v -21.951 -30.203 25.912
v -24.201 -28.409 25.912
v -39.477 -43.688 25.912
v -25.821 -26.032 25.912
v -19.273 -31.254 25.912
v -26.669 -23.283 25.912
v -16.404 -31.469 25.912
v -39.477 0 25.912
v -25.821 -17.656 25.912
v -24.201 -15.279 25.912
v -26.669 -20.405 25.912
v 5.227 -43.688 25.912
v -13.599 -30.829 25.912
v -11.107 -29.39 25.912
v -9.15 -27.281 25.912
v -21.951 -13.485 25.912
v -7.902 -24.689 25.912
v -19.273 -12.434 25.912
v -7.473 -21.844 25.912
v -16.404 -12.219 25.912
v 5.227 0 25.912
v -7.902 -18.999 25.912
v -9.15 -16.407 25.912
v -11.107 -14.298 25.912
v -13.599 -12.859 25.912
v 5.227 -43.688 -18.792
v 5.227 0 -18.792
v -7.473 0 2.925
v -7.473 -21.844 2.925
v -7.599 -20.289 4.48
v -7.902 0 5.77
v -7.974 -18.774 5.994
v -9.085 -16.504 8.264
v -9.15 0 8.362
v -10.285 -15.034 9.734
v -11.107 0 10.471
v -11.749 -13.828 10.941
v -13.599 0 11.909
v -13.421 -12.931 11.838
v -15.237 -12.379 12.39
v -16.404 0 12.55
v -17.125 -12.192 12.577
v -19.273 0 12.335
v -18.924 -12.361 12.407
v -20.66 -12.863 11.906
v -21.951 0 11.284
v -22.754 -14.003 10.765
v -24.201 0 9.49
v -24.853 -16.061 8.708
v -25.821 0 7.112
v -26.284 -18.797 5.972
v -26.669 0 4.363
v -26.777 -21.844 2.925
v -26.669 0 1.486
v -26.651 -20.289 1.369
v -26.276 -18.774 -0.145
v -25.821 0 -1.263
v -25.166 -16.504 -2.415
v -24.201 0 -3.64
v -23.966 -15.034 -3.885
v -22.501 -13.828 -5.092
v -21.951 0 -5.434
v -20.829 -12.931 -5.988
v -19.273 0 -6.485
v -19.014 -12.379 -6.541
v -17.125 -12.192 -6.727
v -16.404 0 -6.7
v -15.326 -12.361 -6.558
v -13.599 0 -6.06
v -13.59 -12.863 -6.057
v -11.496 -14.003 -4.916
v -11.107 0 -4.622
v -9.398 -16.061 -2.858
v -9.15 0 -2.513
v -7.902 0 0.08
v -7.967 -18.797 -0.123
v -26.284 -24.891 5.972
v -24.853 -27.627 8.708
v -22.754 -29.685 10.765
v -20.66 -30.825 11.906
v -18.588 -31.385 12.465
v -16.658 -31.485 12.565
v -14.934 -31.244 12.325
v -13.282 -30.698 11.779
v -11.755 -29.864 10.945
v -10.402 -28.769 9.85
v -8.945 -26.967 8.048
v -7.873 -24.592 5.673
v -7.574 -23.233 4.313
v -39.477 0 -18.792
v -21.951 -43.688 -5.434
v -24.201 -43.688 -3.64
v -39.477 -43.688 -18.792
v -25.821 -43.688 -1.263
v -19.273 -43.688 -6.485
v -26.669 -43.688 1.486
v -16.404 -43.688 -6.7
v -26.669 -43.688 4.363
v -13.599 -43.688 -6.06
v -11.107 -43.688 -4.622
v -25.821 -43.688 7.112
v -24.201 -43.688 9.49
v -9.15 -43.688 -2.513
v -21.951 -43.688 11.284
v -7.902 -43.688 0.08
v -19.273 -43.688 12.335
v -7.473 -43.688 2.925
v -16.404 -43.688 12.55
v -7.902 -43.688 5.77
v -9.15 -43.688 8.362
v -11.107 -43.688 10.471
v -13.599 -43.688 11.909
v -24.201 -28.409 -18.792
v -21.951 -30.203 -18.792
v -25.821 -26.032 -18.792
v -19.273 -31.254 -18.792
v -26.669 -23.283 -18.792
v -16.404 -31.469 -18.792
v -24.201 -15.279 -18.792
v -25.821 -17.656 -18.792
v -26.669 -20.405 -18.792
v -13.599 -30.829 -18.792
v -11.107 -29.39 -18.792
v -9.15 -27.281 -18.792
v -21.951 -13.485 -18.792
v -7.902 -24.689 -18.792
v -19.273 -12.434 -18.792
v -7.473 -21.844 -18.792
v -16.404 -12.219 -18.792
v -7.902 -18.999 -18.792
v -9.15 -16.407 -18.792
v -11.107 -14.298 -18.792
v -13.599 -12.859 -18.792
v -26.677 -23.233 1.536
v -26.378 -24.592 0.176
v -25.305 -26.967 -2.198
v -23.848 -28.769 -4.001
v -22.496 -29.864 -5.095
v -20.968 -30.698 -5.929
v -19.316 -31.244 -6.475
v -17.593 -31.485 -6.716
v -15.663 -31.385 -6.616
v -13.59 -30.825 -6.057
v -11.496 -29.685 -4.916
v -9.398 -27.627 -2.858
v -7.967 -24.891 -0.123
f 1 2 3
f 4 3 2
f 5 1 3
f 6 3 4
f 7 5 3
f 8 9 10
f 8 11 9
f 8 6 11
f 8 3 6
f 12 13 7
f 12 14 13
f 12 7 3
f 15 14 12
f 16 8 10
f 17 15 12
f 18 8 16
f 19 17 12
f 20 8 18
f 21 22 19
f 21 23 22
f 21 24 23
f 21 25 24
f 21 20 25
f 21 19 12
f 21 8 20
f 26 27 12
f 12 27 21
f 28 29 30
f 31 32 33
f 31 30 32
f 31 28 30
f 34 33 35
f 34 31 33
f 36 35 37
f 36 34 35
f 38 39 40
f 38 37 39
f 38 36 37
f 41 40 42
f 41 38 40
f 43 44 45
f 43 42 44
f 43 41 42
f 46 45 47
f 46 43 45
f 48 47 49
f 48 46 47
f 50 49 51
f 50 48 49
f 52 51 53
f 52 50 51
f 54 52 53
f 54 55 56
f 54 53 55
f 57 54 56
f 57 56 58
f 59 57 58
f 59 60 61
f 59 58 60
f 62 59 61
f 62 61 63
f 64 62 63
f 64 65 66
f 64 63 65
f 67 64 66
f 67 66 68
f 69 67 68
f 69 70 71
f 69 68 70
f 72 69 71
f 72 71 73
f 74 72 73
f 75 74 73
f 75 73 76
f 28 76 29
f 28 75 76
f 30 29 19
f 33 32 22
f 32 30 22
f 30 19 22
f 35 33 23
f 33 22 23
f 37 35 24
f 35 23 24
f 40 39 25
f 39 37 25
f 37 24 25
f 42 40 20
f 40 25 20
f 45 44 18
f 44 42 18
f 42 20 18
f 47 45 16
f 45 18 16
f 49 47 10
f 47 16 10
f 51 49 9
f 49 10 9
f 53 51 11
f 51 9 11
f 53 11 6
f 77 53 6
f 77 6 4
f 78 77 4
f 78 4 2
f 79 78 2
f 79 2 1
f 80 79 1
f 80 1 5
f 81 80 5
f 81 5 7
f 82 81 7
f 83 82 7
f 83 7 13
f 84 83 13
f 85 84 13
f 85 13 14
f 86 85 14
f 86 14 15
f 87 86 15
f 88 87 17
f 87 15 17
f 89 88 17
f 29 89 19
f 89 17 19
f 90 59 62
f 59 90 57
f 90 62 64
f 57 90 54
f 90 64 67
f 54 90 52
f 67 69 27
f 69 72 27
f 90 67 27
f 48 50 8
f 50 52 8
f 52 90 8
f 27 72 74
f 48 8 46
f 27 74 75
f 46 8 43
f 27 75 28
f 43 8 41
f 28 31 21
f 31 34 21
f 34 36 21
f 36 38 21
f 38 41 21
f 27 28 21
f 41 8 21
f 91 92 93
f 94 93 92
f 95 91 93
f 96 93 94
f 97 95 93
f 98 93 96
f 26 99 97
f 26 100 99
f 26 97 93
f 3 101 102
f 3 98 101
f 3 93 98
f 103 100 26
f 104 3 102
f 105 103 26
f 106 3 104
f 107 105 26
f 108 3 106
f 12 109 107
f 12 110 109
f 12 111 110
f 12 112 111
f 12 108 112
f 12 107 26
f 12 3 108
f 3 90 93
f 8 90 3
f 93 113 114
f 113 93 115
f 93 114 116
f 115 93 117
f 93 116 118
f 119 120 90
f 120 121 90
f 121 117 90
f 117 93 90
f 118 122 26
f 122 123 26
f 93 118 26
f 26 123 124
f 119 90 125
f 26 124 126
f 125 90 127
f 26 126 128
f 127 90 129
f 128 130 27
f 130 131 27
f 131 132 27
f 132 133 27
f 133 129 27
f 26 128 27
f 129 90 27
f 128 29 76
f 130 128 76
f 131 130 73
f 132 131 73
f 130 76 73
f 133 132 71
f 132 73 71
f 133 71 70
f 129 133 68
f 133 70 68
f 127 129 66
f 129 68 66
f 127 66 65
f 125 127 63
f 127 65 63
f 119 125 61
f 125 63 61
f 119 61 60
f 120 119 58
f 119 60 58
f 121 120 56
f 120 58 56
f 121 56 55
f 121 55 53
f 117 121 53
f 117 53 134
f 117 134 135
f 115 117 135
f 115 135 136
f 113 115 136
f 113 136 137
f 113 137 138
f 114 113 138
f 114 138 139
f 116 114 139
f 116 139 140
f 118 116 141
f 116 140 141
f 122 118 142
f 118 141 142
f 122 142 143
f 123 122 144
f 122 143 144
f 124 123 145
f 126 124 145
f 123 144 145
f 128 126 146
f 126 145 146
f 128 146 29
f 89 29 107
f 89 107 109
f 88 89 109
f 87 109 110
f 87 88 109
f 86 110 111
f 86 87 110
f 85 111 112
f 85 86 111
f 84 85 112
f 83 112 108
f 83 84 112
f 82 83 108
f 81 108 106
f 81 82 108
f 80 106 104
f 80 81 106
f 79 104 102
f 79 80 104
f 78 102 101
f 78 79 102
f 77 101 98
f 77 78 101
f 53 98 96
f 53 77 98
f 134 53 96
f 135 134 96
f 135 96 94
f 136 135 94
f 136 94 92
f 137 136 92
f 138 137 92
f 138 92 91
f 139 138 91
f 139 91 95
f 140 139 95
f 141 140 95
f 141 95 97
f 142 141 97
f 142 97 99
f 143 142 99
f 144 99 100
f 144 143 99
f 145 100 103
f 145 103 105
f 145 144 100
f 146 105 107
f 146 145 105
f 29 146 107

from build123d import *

# Parameters (mm, degrees)
F0_W     = 44.704
F0_H     = 44.704
F0_R     = 9.652
F1_DEPTH = 43.688
F2_R     = 9.652
F3_DEPTH = 44.705


with BuildPart() as f1:
    # F0 (on Front) → F1 (new body)
    with BuildSketch(Plane.XZ):
        with Locations((-17.125217, 3.559626)):
            Rectangle(F0_W, F0_H)
        with Locations((-17.125217, 2.924626)):
            Circle(F0_R, mode=Mode.SUBTRACT)
    extrude(amount=F1_DEPTH)

    # F2 (on face) → F3 (cut, through all)
    with BuildSketch(Plane.XY.offset(25.911626)):
        with Locations((-17.125217, -21.844)):
            Circle(F2_R)
    extrude(amount=-F3_DEPTH, mode=Mode.SUBTRACT)


solid = f1.part
